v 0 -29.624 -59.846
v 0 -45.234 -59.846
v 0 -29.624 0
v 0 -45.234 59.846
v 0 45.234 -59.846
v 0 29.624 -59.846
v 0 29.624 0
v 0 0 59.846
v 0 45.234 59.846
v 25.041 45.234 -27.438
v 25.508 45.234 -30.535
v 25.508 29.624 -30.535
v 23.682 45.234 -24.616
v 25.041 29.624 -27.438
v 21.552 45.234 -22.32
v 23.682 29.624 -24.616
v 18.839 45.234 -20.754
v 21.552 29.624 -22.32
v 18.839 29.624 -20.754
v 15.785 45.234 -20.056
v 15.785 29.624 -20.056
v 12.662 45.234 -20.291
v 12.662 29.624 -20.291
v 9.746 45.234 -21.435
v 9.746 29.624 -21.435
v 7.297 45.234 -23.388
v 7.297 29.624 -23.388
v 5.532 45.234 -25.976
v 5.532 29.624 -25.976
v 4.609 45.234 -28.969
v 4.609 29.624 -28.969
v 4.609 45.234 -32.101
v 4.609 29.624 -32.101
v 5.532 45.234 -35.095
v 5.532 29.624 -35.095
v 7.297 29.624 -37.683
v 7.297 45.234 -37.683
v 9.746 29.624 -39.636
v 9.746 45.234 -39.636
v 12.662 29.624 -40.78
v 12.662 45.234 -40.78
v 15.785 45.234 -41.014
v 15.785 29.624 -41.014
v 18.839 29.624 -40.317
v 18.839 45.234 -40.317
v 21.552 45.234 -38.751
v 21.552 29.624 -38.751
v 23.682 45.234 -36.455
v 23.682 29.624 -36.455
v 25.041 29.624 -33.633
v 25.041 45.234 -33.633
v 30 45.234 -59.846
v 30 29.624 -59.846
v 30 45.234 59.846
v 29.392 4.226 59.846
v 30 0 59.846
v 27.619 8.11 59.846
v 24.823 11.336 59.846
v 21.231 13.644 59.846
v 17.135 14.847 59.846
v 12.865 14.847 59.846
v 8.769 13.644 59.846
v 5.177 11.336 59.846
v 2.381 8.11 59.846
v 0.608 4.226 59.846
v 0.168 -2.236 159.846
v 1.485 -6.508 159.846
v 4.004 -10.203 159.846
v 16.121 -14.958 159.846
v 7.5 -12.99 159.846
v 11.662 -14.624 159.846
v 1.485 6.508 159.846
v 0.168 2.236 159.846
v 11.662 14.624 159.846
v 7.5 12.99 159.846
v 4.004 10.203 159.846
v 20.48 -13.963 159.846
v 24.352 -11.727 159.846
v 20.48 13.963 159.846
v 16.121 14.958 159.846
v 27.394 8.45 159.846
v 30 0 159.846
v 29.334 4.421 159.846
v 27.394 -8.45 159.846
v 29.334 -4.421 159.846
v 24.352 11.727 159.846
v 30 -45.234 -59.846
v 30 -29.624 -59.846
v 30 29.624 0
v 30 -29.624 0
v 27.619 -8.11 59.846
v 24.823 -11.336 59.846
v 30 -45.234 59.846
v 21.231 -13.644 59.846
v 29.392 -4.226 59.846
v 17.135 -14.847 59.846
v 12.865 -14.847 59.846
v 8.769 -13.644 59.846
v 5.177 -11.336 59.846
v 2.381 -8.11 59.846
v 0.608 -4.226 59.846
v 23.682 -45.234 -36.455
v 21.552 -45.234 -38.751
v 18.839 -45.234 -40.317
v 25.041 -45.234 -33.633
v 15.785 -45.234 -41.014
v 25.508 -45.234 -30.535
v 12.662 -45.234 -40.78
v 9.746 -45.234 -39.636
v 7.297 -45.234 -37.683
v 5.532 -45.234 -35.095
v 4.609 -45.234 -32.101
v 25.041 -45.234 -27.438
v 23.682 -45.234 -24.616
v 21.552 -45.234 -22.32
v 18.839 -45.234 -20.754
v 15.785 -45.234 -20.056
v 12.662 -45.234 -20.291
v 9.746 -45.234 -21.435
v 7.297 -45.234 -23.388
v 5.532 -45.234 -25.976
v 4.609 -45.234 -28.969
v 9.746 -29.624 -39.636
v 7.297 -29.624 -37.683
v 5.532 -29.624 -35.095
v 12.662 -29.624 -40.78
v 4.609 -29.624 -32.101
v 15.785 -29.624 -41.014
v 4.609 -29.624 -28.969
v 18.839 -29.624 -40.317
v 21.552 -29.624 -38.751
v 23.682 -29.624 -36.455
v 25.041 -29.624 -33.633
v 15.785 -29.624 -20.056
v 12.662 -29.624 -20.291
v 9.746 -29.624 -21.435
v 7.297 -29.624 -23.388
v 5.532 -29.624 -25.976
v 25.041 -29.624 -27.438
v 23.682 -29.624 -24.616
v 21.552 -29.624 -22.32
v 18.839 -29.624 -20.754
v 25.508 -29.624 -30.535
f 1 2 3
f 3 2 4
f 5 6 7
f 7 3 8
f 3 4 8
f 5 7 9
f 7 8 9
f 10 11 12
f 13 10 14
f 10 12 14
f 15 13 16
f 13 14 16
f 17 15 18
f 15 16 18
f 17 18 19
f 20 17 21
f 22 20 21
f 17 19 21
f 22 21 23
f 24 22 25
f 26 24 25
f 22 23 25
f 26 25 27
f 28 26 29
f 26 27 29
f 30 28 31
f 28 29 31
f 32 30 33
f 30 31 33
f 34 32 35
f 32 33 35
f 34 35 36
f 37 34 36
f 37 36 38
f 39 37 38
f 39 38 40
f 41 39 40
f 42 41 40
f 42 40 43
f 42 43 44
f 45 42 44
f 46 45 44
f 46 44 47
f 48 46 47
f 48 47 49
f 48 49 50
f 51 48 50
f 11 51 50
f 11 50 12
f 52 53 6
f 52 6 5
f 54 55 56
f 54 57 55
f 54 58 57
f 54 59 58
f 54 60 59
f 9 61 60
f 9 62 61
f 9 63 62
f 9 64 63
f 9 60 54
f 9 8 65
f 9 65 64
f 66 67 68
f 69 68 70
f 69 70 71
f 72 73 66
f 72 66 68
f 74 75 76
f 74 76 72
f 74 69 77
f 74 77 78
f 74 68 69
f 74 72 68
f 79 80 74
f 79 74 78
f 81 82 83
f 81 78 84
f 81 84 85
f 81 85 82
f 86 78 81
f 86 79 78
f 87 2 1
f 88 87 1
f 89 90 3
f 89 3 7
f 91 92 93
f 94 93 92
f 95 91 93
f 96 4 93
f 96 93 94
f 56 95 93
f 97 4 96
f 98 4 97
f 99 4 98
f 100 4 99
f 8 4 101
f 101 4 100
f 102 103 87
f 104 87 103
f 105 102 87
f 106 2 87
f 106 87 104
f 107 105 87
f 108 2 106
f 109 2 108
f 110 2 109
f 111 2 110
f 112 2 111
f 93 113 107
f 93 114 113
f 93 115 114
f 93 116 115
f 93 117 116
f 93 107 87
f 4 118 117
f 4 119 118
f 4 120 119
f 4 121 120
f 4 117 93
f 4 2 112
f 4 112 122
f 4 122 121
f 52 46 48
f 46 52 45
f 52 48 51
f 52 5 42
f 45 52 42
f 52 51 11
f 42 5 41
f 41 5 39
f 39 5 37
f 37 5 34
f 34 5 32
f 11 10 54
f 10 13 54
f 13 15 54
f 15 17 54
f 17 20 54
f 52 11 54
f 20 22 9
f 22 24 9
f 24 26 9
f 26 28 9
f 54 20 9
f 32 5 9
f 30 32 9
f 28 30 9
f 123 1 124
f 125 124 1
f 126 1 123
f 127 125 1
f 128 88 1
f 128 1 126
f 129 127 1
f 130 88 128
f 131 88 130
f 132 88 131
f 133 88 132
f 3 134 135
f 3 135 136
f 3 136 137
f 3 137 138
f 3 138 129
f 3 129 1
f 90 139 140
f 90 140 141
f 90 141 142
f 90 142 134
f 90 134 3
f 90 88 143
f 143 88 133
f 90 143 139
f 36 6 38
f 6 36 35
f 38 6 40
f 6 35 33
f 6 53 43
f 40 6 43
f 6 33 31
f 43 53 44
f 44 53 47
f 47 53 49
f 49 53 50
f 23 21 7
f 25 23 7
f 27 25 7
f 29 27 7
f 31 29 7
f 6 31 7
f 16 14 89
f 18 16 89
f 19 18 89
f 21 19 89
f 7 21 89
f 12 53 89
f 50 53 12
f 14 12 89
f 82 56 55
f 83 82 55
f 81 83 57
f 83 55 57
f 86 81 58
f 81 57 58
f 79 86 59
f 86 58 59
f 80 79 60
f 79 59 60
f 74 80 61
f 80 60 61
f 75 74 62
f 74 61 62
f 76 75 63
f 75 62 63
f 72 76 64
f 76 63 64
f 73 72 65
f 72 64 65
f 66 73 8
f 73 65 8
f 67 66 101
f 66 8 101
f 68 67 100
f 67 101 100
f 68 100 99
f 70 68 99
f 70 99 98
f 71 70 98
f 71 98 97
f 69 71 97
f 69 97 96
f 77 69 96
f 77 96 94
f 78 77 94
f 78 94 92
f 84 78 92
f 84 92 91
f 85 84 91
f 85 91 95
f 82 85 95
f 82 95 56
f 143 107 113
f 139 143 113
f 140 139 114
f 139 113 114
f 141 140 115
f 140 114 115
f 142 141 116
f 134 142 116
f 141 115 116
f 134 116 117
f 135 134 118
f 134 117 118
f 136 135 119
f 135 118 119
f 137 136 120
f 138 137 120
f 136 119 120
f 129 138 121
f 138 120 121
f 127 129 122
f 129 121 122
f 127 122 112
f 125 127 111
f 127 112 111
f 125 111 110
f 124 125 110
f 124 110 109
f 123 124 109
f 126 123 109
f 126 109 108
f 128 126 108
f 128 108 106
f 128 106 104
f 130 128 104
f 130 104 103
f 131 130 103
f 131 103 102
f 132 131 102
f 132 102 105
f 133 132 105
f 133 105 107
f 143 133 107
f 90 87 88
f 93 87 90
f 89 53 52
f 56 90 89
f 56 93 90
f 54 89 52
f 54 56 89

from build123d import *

# Parameters (mm, degrees)
F0_W     = 90.468154
F0_H     = 119.692906
F1_DEPTH = 30
F2_W     = 59.248916
F2_H     = 119.692907
F3_DEPTH = 30
F4_R     = 15
F5_DEPTH = 100
F6_R     = 10.508177
F7_DEPTH = 100


with BuildPart() as f1:
    # F0 (on Right) → F1 (new body)
    with BuildSketch(Plane.YZ):
        Rectangle(F0_W, F0_H)
    extrude(amount=F1_DEPTH)

    # F2 (on face) → F3 (cut)
    with BuildSketch(Plane.YZ.offset(30)):
        with Locations((0, -59.846453)):
            Rectangle(F2_W, F2_H)
    extrude(amount=-F3_DEPTH, mode=Mode.SUBTRACT)

    # F4 (on face) → F5 (join)
    with BuildSketch(Plane.XY.offset(59.846453)):
        with Locations((15, 0)):
            Circle(F4_R)
    extrude(amount=F5_DEPTH)

    # F6 (on face) → F7 (cut)
    with BuildSketch(Plane.XZ.offset(45.234077)):
        with Locations((15, -30.535292)):
            Circle(F6_R)
    extrude(amount=-F7_DEPTH, mode=Mode.SUBTRACT)


solid = f1.part
